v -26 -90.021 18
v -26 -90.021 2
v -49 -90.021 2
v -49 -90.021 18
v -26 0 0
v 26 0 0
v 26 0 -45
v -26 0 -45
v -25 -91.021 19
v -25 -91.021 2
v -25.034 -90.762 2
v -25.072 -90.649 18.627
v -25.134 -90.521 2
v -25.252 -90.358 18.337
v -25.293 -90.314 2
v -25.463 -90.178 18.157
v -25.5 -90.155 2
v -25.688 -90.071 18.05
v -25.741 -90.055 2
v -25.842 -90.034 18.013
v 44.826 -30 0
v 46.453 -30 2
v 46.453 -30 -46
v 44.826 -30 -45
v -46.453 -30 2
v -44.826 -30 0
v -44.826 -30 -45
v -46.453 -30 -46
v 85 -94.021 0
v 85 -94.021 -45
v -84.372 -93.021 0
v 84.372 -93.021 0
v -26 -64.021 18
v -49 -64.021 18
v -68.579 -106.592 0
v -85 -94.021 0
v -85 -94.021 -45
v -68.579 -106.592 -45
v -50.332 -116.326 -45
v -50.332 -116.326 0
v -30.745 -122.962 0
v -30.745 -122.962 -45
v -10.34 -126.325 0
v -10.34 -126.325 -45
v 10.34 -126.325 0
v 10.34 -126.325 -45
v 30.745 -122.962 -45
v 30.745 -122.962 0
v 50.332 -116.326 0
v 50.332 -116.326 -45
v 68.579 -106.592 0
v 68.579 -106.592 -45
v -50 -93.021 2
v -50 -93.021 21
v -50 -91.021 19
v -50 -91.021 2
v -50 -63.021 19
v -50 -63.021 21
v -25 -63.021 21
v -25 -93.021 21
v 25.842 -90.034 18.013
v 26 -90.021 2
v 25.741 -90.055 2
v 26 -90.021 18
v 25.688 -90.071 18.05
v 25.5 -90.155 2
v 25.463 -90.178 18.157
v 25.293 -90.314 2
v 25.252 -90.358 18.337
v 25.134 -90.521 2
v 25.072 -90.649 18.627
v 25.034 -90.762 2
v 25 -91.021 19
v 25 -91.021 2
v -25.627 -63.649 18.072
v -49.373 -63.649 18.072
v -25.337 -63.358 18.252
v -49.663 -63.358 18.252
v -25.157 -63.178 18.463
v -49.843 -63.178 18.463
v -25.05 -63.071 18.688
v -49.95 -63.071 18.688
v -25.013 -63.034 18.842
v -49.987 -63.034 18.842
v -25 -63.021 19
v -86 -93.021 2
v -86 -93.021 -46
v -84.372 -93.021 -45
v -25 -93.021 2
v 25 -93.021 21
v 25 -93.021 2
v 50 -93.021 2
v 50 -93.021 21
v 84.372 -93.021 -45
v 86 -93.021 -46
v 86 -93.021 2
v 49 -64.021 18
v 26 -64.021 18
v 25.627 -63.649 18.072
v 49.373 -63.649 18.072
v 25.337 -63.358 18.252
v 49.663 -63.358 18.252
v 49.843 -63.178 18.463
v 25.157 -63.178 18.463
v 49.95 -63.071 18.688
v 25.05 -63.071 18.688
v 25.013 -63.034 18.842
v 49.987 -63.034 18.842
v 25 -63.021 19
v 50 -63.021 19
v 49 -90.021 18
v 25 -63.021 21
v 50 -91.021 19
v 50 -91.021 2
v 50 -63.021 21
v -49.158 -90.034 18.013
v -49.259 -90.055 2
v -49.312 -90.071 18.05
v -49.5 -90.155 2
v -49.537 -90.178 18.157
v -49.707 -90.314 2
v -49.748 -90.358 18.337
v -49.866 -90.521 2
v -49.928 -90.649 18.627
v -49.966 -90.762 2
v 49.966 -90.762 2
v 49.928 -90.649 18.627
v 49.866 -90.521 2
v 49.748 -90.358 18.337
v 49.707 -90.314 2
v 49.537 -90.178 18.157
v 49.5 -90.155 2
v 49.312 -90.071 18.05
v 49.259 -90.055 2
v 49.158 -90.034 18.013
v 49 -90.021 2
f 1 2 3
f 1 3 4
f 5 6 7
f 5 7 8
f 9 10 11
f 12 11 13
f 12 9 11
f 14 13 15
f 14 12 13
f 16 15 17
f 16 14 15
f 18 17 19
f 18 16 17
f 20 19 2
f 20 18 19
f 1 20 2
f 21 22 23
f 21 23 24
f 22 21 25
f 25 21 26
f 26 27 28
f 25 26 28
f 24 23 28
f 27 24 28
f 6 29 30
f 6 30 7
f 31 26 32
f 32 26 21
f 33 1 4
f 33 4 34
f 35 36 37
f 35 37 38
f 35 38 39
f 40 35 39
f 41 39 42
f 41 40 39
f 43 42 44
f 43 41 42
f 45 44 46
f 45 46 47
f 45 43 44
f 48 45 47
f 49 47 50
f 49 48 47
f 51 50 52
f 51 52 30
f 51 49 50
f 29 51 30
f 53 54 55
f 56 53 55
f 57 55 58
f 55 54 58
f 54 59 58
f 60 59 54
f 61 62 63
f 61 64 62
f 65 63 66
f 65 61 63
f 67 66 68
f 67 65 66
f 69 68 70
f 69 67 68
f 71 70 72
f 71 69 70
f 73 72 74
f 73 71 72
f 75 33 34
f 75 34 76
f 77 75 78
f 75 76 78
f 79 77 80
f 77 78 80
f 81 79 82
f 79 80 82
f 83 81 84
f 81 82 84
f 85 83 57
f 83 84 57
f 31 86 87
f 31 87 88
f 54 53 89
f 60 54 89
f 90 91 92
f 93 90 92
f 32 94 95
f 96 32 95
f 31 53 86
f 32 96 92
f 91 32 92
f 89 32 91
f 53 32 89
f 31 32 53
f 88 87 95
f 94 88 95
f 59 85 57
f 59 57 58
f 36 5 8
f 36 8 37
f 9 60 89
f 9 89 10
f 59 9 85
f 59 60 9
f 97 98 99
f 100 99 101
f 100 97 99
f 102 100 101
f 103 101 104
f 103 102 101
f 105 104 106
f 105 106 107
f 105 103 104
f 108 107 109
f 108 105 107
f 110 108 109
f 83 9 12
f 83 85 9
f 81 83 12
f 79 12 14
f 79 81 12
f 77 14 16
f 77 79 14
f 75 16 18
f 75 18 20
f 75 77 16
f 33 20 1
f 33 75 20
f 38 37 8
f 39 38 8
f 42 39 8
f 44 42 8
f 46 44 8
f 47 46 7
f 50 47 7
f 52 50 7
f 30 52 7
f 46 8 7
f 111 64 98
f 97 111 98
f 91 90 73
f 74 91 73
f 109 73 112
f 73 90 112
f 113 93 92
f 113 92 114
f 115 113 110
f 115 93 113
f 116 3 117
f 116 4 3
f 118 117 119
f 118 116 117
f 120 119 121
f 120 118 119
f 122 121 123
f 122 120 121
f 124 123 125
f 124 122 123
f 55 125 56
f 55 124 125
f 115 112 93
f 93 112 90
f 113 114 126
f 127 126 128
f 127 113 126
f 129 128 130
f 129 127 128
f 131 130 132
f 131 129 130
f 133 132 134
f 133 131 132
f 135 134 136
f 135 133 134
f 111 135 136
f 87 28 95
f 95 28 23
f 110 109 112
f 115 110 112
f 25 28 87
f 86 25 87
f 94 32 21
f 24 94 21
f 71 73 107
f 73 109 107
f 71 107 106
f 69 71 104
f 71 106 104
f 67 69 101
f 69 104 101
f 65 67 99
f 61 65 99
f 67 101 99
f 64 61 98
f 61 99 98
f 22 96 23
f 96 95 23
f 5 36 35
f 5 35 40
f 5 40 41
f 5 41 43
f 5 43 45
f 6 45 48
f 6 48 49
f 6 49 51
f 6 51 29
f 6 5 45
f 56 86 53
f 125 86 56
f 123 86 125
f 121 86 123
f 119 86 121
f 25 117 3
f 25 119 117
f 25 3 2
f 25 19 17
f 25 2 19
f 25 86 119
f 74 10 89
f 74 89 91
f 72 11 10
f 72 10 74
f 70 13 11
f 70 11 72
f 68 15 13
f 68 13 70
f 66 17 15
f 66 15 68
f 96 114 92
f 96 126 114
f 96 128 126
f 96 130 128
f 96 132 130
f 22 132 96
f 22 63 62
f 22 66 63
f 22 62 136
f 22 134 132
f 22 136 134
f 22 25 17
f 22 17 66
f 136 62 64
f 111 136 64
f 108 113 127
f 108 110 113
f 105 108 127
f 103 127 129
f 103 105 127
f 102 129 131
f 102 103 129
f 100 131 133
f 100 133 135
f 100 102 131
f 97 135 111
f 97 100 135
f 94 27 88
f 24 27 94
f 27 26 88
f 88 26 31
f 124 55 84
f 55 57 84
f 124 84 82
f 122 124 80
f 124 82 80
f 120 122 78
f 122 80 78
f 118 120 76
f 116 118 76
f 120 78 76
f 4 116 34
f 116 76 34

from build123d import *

# Parameters (mm, degrees)
F1_DEPTH      = 45
F3_DEPTH      = 46
F3_DEPTH_BACK = 2
F6_START      = 25
F6_DEPTH      = 25
F8_R          = 1


with BuildPart() as f1:
    # F0 (on Top) → F1 (new body)
    with BuildSketch(Plane.XY):
        with BuildLine():
            Line((85, -94.0212741883), (26, 0))
            Line((26, 0), (-26, 0))
            Line((-26, 0), (-85, -94.0212741883))
            ThreePointArc((-85, -94.0212741883), (0, -126.7477810457), (85, -94.0212741883))
        make_face()
    extrude(amount=-F1_DEPTH)


with BuildPart() as f3:
    # F2 (on Top) → F3 (new body, two sides)
    with BuildSketch(Plane.XY) as f3_sk:
        Polygon((-46.4530441731, -30), (-86, -93.0212741883), (86, -93.0212741883), (46.4530441731, -30), align=None)
    extrude(amount=-F3_DEPTH)
    extrude(f3_sk.sketch, amount=F3_DEPTH_BACK)

    # F4: cut F1
    add(f1.part, mode=Mode.SUBTRACT)



with BuildPart() as f6:
    # F5 (on Right) → F6 (new body)
    with BuildSketch(Plane.YZ.offset(F6_START)):
        Polygon((-90.0212741883, 18), (-63.0212741883, 18), (-63.0212741883, 21), (-93.0212741883, 21), (-93.0212741883, 2), (-90.0212741883, 2), align=None)
    extrude(amount=F6_DEPTH)


with BuildPart() as f3_1:
    add(f3.part)

    add(f6.part)  # F7 merges F6
    # F7: F6 across plane
    add(f6.part.mirror(Plane.YZ))

    # F8
    f8_edges = [f3_1.edges().sort_by_distance(p)[0] for p in [
        (-37.5, -63.021274, 18),
        (37.5, -63.021274, 18),
        (50, -76.521274, 18),
        (25, -76.521274, 18),
        (-25, -76.521274, 18),
        (-50, -76.521274, 18),
        (-50, -90.021274, 10),
        (-25, -90.021274, 10),
        (25, -90.021274, 10),
        (50, -90.021274, 10),
    ]]
    fillet(f8_edges, radius=F8_R)


solid = Compound([f1.part, f3_1.part])
